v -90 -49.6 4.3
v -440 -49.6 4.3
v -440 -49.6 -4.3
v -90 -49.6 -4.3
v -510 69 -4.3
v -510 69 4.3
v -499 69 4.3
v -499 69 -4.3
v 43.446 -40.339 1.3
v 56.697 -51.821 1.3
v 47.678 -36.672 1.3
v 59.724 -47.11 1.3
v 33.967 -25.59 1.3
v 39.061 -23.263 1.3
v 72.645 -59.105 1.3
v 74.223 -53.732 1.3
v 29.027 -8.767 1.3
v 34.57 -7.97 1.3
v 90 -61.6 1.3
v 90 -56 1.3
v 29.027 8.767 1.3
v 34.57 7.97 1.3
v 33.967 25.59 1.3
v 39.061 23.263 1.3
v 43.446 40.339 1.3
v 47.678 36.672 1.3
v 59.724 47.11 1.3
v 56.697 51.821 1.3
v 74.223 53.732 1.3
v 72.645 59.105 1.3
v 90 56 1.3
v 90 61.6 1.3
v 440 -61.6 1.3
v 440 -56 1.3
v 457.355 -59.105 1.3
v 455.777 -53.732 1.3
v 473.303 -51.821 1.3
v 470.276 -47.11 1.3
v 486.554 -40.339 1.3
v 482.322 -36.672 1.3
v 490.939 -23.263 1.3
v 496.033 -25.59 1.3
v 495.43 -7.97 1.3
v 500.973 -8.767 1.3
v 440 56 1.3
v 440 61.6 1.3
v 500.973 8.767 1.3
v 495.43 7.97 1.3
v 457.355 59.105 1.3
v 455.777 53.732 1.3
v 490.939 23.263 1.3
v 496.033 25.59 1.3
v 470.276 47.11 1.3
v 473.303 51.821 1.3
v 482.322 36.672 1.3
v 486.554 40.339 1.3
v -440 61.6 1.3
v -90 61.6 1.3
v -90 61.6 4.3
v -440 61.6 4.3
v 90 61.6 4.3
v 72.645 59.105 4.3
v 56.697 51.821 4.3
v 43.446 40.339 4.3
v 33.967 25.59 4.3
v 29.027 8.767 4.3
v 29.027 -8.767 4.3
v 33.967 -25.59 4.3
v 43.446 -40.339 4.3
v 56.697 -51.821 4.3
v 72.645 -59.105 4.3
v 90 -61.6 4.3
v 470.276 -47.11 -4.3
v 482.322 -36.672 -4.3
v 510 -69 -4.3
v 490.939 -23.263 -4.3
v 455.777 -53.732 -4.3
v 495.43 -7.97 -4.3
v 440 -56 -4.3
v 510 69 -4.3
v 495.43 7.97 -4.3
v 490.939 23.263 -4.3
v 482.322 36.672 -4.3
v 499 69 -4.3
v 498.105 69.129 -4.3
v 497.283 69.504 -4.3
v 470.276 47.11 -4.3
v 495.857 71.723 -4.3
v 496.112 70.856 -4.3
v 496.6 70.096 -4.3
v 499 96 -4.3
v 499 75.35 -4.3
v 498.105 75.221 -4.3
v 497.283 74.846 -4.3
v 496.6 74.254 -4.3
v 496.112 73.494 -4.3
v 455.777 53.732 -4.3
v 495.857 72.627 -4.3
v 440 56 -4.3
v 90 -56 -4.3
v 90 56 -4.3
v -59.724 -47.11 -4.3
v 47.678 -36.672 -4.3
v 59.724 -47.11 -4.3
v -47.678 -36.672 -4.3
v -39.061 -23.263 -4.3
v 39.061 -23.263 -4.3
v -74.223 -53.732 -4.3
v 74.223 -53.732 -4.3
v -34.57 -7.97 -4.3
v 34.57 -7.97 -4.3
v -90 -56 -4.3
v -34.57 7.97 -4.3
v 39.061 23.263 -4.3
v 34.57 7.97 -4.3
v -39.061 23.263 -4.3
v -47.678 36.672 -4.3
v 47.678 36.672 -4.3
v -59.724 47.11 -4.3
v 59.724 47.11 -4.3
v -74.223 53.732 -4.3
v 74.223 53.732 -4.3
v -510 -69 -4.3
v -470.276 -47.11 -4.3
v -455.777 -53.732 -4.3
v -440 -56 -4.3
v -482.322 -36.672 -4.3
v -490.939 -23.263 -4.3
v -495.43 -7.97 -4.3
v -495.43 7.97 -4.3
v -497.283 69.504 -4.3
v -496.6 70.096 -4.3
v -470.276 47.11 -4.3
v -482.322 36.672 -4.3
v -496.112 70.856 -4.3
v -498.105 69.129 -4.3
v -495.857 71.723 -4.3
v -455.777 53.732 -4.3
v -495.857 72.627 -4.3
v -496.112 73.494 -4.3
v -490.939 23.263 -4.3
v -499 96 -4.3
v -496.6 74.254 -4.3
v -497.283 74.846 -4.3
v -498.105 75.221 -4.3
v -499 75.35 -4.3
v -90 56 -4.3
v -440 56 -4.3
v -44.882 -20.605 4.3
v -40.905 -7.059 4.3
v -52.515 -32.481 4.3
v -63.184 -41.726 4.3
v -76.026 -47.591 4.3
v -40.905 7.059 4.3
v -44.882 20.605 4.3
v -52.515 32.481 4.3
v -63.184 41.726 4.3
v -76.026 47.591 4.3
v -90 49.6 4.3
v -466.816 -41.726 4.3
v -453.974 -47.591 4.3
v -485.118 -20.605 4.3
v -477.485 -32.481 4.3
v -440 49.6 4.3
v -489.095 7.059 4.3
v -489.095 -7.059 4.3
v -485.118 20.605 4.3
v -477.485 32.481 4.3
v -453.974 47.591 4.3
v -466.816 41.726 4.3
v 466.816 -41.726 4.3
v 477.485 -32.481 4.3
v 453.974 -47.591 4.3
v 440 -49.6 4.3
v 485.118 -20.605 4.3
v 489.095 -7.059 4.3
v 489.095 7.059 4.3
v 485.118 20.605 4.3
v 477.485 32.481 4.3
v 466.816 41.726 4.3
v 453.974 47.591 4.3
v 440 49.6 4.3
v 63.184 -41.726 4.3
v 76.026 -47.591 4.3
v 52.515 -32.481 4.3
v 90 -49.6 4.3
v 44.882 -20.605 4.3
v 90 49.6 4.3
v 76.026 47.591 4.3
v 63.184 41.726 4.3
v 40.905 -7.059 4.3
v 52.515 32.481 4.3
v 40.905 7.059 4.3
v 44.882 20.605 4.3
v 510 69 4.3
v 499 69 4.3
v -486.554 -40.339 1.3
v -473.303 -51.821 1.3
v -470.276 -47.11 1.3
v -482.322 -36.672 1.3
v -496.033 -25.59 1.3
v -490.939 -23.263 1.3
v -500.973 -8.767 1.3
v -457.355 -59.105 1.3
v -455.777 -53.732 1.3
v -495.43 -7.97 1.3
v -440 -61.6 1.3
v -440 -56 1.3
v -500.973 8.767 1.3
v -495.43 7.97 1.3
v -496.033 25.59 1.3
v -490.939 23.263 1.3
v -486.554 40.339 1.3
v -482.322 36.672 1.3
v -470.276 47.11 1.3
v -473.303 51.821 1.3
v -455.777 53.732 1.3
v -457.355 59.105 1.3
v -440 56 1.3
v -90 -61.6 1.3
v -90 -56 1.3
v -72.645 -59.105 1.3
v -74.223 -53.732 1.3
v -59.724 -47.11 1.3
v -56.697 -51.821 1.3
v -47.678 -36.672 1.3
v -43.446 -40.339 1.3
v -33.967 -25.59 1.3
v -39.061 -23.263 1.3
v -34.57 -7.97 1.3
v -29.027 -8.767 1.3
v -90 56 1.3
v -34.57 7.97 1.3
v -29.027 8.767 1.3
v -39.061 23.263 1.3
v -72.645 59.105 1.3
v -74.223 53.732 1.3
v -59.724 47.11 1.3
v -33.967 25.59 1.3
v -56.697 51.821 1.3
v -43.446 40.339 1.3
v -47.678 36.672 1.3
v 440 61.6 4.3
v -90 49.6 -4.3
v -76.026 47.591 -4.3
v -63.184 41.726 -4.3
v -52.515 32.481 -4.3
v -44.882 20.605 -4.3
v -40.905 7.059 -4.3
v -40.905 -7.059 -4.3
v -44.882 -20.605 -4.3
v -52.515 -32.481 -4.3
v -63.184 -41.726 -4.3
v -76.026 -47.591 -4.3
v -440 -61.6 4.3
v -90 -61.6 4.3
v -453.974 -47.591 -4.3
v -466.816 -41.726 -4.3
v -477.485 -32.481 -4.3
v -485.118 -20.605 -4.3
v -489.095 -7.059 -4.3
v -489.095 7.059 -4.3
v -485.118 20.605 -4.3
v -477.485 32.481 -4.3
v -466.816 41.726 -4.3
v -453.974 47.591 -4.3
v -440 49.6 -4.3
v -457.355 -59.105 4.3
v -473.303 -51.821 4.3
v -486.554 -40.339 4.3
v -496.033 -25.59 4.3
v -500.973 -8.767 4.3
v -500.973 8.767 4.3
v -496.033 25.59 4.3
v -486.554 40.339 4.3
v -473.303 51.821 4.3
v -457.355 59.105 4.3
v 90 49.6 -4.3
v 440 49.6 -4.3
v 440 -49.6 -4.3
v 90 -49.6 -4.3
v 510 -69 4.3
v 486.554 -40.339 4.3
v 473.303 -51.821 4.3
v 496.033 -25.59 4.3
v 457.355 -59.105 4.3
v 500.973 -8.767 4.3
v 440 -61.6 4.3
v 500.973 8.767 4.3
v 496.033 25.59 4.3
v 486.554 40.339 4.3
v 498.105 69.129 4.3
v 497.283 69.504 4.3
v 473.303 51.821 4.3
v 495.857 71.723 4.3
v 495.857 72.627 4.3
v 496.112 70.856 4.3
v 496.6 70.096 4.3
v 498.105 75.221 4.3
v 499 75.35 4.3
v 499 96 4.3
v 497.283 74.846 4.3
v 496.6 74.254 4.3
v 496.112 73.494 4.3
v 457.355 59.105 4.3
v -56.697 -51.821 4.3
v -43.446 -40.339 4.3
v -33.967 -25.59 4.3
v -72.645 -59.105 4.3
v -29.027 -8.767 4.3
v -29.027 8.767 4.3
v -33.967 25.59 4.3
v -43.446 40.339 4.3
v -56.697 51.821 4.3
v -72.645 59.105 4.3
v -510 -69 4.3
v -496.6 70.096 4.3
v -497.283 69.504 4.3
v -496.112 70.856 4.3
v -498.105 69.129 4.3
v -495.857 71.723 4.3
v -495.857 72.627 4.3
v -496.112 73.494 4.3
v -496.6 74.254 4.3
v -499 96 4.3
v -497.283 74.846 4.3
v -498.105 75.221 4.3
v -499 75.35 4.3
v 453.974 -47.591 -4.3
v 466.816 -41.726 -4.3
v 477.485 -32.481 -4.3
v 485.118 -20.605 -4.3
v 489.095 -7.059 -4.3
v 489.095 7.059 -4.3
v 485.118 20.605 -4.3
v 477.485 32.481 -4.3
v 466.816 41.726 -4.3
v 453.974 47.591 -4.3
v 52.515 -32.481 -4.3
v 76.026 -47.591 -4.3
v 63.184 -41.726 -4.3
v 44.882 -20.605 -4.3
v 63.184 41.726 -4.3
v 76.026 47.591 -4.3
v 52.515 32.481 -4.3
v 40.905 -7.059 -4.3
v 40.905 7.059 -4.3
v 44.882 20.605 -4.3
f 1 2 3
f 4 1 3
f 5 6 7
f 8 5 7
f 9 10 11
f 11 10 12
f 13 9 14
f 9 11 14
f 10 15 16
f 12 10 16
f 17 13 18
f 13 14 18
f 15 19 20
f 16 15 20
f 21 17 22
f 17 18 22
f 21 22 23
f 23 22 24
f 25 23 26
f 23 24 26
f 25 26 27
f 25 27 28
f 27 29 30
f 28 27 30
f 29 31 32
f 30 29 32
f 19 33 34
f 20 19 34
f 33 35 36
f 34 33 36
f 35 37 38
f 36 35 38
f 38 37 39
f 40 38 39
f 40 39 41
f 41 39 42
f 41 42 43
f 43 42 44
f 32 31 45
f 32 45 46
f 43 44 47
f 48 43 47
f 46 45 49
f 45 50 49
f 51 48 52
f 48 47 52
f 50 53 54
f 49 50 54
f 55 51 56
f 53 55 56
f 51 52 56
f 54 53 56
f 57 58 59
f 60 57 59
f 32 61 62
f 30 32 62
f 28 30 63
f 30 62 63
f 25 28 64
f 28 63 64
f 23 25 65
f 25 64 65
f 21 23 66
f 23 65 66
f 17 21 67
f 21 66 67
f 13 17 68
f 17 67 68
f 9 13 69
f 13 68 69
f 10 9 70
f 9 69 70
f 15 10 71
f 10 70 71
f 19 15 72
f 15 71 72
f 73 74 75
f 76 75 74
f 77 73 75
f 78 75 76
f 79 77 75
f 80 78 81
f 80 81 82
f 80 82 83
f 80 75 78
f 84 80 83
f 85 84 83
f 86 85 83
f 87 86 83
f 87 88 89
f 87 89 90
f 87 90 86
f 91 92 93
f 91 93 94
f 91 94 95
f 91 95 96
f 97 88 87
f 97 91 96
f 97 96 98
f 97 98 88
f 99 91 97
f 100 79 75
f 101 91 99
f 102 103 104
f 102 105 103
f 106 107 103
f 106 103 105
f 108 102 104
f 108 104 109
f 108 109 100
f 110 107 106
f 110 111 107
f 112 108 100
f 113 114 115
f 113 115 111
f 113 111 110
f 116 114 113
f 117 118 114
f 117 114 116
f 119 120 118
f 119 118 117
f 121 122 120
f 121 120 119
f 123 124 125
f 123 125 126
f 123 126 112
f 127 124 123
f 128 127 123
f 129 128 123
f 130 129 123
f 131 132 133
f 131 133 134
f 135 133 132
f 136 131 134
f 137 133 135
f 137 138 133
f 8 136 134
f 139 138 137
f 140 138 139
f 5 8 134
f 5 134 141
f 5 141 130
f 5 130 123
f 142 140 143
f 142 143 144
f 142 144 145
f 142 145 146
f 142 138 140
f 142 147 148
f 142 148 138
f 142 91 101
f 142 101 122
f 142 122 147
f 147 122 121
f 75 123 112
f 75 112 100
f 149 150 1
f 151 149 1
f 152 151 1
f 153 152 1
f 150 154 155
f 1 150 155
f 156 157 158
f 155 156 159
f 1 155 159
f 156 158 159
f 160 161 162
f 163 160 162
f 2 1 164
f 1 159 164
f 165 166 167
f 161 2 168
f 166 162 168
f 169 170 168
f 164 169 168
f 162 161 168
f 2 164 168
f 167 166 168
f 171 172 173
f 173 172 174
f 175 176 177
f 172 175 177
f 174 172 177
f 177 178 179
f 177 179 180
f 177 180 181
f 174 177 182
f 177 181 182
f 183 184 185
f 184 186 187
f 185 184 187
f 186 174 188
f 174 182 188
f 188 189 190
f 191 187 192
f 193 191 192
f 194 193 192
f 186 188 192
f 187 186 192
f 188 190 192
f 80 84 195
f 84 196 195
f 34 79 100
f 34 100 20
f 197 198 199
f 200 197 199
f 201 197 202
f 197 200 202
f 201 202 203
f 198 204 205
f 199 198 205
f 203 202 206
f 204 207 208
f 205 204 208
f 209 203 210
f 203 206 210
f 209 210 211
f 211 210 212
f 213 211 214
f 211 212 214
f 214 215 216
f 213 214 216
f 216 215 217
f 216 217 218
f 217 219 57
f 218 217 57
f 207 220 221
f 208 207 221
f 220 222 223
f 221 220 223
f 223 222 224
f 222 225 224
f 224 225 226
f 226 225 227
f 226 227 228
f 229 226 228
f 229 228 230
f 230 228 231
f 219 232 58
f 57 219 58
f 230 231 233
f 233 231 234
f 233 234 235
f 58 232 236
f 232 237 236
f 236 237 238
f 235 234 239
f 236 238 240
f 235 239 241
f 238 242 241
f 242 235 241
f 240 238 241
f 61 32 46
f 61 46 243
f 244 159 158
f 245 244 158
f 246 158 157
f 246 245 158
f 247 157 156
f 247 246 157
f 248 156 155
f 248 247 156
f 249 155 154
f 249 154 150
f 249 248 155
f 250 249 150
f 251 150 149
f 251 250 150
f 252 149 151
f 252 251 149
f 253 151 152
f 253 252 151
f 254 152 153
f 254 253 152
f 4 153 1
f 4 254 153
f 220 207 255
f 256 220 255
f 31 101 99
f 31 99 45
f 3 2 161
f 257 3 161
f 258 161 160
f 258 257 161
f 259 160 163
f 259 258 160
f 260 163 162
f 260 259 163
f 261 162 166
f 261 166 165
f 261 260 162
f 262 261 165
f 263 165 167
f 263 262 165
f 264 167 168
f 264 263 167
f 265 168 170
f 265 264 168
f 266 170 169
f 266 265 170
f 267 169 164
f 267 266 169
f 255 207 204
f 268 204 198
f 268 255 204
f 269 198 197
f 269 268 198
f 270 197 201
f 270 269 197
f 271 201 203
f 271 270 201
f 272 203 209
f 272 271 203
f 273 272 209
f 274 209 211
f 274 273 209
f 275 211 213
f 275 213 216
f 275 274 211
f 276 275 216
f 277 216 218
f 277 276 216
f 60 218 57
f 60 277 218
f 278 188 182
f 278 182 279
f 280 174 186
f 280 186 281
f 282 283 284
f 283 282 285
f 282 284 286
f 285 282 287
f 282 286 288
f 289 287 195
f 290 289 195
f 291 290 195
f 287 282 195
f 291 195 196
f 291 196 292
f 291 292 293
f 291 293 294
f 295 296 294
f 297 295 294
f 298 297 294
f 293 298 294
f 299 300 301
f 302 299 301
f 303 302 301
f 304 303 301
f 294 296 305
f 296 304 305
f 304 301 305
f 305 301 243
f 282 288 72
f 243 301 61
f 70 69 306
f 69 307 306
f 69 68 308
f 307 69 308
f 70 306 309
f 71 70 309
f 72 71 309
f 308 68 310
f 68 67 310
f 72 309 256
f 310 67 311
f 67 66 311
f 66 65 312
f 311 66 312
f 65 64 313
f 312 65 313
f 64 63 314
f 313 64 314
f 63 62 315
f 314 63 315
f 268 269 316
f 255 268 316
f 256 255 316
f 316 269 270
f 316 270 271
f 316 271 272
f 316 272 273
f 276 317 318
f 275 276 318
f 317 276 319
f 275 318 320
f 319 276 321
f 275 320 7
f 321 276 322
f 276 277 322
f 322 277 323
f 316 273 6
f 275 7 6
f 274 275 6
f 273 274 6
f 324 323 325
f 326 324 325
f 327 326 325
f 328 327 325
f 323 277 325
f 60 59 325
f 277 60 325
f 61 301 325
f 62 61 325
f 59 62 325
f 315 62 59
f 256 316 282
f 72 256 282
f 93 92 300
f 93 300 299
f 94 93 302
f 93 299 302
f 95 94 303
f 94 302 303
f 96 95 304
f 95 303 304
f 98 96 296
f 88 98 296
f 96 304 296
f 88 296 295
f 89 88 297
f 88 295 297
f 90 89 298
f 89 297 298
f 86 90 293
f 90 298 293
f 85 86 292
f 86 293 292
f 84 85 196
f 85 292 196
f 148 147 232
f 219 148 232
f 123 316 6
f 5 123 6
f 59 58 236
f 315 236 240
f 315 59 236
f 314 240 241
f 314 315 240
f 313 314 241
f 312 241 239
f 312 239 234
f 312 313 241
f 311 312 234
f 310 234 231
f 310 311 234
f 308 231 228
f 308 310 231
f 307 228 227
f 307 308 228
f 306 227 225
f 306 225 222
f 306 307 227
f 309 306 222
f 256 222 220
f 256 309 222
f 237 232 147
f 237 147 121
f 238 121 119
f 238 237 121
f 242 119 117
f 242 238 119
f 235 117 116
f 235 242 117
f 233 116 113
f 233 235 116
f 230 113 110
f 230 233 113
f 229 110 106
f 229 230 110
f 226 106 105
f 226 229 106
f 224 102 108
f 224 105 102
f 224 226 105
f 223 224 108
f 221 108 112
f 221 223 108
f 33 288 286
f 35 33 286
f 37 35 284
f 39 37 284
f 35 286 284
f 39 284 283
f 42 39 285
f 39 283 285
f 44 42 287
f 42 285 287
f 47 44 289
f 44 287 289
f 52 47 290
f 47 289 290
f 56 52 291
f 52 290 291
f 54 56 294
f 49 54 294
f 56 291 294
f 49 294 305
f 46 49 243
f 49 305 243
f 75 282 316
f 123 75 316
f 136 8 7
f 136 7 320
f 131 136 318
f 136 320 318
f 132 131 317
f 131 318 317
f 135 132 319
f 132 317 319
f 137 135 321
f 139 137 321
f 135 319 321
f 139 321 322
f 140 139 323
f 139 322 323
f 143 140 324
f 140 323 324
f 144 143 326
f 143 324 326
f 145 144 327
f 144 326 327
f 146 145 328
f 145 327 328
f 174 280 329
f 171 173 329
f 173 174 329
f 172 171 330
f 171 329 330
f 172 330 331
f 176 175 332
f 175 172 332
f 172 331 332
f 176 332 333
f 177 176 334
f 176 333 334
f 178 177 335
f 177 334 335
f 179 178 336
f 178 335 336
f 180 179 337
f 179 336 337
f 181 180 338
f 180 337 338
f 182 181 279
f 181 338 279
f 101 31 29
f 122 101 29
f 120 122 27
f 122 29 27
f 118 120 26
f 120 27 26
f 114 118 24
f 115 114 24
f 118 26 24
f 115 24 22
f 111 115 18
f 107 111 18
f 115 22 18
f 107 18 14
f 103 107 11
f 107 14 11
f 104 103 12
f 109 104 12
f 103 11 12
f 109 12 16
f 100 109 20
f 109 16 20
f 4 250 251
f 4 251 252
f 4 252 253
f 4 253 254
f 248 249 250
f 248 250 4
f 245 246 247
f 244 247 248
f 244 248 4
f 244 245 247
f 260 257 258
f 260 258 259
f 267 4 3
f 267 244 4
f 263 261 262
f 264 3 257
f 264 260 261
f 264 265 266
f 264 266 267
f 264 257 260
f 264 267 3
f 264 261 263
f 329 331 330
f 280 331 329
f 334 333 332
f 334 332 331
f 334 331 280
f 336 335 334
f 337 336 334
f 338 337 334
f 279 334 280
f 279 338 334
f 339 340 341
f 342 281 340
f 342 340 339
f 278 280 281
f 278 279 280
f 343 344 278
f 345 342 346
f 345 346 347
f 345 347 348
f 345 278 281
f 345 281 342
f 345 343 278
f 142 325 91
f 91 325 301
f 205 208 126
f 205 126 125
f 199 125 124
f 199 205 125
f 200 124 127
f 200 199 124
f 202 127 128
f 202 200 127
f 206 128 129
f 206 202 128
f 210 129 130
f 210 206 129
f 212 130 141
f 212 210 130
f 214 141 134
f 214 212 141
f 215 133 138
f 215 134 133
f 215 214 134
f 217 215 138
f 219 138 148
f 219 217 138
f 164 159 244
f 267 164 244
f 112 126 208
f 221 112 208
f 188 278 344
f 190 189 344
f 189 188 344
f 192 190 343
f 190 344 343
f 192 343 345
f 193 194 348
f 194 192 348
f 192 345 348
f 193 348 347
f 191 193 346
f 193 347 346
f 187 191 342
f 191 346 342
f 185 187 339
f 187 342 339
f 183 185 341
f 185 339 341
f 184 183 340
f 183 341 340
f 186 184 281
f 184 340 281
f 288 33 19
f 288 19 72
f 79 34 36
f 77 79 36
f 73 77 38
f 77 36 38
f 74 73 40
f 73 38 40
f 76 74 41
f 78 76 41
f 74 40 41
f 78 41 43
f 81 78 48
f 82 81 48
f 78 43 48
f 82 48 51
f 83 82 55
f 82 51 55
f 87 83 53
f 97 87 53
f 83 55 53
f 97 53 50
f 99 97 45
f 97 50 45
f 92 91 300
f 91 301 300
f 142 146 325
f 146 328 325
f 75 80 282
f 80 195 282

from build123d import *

# Parameters (mm, degrees)
BOSS_EXTRUDE1_DEPTH = 4.3


with BuildPart() as part:
    # Sketch1 → Boss-Extrude1 (new body, symmetric)
    with BuildSketch(Plane.XY):
        with BuildLine():
            Line((-510, 69), (-499, 69))
            ThreePointArc((-499, 69), (-495.825, 72.175), (-499, 75.35))
            Line((-499, 75.35), (-499, 96))
            Line((-499, 96), (499, 96))
            Line((499, 96), (499, 75.35))
            ThreePointArc((499, 75.35), (495.825, 72.175), (499, 69))
            Line((499, 69), (510, 69))
            Line((510, 69), (510, -69))
            Line((510, -69), (-510, -69))
            Line((-510, -69), (-510, 69))
        make_face()
    extrude(amount=BOSS_EXTRUDE1_DEPTH, both=True)

    # Cut-Sweep2: sweep along a path in Sketch2
    with BuildLine(Plane.XY) as cut_sweep2_path:
        Line((-440, 50), (-90, 50))
        ThreePointArc((-90, 50), (-40, 0), (-90, -50))
        Line((-90, -50), (-440, -50))
        ThreePointArc((-440, -50), (-490, 0), (-440, 50))
    # Sketch3 → Cut-Sweep2 (sweep, cut)
    with BuildSketch(Plane(origin=(-440, 0, 0), x_dir=(0, 0, -1), z_dir=(1, 0, 0))):
        Polygon((5.15697951, 56), (0.014113459, 56), (-1.3, 56), (-1.3, 61.6), (-5.275031484, 61.6), (-5.275031484, 49.6), (5.15697951, 49.6), align=None)
    sweep(path=cut_sweep2_path.line, mode=Mode.SUBTRACT)

    # Cut-Sweep3: sweep along a path in Sketch2_3
    with BuildLine(Plane.XY) as cut_sweep3_path:
        Line((440, 50), (90, 50))
        ThreePointArc((90, 50), (40, 0), (90, -50))
        Line((90, -50), (440, -50))
        ThreePointArc((440, -50), (490, 0), (440, 50))
    # Sketch4 → Cut-Sweep3 (sweep, cut)
    with BuildSketch(Plane(origin=(440, 0, 0), x_dir=(0, 0, -1), z_dir=(1, 0, 0))):
        Polygon((0.014113459, 56), (-1.3, 56), (-1.3, 61.6), (-5.275031484, 61.6), (-5.275031484, 49.6), (5.15697951, 49.6), (5.15697951, 56), align=None)
    sweep(path=cut_sweep3_path.line, mode=Mode.SUBTRACT)


solid = part.part
